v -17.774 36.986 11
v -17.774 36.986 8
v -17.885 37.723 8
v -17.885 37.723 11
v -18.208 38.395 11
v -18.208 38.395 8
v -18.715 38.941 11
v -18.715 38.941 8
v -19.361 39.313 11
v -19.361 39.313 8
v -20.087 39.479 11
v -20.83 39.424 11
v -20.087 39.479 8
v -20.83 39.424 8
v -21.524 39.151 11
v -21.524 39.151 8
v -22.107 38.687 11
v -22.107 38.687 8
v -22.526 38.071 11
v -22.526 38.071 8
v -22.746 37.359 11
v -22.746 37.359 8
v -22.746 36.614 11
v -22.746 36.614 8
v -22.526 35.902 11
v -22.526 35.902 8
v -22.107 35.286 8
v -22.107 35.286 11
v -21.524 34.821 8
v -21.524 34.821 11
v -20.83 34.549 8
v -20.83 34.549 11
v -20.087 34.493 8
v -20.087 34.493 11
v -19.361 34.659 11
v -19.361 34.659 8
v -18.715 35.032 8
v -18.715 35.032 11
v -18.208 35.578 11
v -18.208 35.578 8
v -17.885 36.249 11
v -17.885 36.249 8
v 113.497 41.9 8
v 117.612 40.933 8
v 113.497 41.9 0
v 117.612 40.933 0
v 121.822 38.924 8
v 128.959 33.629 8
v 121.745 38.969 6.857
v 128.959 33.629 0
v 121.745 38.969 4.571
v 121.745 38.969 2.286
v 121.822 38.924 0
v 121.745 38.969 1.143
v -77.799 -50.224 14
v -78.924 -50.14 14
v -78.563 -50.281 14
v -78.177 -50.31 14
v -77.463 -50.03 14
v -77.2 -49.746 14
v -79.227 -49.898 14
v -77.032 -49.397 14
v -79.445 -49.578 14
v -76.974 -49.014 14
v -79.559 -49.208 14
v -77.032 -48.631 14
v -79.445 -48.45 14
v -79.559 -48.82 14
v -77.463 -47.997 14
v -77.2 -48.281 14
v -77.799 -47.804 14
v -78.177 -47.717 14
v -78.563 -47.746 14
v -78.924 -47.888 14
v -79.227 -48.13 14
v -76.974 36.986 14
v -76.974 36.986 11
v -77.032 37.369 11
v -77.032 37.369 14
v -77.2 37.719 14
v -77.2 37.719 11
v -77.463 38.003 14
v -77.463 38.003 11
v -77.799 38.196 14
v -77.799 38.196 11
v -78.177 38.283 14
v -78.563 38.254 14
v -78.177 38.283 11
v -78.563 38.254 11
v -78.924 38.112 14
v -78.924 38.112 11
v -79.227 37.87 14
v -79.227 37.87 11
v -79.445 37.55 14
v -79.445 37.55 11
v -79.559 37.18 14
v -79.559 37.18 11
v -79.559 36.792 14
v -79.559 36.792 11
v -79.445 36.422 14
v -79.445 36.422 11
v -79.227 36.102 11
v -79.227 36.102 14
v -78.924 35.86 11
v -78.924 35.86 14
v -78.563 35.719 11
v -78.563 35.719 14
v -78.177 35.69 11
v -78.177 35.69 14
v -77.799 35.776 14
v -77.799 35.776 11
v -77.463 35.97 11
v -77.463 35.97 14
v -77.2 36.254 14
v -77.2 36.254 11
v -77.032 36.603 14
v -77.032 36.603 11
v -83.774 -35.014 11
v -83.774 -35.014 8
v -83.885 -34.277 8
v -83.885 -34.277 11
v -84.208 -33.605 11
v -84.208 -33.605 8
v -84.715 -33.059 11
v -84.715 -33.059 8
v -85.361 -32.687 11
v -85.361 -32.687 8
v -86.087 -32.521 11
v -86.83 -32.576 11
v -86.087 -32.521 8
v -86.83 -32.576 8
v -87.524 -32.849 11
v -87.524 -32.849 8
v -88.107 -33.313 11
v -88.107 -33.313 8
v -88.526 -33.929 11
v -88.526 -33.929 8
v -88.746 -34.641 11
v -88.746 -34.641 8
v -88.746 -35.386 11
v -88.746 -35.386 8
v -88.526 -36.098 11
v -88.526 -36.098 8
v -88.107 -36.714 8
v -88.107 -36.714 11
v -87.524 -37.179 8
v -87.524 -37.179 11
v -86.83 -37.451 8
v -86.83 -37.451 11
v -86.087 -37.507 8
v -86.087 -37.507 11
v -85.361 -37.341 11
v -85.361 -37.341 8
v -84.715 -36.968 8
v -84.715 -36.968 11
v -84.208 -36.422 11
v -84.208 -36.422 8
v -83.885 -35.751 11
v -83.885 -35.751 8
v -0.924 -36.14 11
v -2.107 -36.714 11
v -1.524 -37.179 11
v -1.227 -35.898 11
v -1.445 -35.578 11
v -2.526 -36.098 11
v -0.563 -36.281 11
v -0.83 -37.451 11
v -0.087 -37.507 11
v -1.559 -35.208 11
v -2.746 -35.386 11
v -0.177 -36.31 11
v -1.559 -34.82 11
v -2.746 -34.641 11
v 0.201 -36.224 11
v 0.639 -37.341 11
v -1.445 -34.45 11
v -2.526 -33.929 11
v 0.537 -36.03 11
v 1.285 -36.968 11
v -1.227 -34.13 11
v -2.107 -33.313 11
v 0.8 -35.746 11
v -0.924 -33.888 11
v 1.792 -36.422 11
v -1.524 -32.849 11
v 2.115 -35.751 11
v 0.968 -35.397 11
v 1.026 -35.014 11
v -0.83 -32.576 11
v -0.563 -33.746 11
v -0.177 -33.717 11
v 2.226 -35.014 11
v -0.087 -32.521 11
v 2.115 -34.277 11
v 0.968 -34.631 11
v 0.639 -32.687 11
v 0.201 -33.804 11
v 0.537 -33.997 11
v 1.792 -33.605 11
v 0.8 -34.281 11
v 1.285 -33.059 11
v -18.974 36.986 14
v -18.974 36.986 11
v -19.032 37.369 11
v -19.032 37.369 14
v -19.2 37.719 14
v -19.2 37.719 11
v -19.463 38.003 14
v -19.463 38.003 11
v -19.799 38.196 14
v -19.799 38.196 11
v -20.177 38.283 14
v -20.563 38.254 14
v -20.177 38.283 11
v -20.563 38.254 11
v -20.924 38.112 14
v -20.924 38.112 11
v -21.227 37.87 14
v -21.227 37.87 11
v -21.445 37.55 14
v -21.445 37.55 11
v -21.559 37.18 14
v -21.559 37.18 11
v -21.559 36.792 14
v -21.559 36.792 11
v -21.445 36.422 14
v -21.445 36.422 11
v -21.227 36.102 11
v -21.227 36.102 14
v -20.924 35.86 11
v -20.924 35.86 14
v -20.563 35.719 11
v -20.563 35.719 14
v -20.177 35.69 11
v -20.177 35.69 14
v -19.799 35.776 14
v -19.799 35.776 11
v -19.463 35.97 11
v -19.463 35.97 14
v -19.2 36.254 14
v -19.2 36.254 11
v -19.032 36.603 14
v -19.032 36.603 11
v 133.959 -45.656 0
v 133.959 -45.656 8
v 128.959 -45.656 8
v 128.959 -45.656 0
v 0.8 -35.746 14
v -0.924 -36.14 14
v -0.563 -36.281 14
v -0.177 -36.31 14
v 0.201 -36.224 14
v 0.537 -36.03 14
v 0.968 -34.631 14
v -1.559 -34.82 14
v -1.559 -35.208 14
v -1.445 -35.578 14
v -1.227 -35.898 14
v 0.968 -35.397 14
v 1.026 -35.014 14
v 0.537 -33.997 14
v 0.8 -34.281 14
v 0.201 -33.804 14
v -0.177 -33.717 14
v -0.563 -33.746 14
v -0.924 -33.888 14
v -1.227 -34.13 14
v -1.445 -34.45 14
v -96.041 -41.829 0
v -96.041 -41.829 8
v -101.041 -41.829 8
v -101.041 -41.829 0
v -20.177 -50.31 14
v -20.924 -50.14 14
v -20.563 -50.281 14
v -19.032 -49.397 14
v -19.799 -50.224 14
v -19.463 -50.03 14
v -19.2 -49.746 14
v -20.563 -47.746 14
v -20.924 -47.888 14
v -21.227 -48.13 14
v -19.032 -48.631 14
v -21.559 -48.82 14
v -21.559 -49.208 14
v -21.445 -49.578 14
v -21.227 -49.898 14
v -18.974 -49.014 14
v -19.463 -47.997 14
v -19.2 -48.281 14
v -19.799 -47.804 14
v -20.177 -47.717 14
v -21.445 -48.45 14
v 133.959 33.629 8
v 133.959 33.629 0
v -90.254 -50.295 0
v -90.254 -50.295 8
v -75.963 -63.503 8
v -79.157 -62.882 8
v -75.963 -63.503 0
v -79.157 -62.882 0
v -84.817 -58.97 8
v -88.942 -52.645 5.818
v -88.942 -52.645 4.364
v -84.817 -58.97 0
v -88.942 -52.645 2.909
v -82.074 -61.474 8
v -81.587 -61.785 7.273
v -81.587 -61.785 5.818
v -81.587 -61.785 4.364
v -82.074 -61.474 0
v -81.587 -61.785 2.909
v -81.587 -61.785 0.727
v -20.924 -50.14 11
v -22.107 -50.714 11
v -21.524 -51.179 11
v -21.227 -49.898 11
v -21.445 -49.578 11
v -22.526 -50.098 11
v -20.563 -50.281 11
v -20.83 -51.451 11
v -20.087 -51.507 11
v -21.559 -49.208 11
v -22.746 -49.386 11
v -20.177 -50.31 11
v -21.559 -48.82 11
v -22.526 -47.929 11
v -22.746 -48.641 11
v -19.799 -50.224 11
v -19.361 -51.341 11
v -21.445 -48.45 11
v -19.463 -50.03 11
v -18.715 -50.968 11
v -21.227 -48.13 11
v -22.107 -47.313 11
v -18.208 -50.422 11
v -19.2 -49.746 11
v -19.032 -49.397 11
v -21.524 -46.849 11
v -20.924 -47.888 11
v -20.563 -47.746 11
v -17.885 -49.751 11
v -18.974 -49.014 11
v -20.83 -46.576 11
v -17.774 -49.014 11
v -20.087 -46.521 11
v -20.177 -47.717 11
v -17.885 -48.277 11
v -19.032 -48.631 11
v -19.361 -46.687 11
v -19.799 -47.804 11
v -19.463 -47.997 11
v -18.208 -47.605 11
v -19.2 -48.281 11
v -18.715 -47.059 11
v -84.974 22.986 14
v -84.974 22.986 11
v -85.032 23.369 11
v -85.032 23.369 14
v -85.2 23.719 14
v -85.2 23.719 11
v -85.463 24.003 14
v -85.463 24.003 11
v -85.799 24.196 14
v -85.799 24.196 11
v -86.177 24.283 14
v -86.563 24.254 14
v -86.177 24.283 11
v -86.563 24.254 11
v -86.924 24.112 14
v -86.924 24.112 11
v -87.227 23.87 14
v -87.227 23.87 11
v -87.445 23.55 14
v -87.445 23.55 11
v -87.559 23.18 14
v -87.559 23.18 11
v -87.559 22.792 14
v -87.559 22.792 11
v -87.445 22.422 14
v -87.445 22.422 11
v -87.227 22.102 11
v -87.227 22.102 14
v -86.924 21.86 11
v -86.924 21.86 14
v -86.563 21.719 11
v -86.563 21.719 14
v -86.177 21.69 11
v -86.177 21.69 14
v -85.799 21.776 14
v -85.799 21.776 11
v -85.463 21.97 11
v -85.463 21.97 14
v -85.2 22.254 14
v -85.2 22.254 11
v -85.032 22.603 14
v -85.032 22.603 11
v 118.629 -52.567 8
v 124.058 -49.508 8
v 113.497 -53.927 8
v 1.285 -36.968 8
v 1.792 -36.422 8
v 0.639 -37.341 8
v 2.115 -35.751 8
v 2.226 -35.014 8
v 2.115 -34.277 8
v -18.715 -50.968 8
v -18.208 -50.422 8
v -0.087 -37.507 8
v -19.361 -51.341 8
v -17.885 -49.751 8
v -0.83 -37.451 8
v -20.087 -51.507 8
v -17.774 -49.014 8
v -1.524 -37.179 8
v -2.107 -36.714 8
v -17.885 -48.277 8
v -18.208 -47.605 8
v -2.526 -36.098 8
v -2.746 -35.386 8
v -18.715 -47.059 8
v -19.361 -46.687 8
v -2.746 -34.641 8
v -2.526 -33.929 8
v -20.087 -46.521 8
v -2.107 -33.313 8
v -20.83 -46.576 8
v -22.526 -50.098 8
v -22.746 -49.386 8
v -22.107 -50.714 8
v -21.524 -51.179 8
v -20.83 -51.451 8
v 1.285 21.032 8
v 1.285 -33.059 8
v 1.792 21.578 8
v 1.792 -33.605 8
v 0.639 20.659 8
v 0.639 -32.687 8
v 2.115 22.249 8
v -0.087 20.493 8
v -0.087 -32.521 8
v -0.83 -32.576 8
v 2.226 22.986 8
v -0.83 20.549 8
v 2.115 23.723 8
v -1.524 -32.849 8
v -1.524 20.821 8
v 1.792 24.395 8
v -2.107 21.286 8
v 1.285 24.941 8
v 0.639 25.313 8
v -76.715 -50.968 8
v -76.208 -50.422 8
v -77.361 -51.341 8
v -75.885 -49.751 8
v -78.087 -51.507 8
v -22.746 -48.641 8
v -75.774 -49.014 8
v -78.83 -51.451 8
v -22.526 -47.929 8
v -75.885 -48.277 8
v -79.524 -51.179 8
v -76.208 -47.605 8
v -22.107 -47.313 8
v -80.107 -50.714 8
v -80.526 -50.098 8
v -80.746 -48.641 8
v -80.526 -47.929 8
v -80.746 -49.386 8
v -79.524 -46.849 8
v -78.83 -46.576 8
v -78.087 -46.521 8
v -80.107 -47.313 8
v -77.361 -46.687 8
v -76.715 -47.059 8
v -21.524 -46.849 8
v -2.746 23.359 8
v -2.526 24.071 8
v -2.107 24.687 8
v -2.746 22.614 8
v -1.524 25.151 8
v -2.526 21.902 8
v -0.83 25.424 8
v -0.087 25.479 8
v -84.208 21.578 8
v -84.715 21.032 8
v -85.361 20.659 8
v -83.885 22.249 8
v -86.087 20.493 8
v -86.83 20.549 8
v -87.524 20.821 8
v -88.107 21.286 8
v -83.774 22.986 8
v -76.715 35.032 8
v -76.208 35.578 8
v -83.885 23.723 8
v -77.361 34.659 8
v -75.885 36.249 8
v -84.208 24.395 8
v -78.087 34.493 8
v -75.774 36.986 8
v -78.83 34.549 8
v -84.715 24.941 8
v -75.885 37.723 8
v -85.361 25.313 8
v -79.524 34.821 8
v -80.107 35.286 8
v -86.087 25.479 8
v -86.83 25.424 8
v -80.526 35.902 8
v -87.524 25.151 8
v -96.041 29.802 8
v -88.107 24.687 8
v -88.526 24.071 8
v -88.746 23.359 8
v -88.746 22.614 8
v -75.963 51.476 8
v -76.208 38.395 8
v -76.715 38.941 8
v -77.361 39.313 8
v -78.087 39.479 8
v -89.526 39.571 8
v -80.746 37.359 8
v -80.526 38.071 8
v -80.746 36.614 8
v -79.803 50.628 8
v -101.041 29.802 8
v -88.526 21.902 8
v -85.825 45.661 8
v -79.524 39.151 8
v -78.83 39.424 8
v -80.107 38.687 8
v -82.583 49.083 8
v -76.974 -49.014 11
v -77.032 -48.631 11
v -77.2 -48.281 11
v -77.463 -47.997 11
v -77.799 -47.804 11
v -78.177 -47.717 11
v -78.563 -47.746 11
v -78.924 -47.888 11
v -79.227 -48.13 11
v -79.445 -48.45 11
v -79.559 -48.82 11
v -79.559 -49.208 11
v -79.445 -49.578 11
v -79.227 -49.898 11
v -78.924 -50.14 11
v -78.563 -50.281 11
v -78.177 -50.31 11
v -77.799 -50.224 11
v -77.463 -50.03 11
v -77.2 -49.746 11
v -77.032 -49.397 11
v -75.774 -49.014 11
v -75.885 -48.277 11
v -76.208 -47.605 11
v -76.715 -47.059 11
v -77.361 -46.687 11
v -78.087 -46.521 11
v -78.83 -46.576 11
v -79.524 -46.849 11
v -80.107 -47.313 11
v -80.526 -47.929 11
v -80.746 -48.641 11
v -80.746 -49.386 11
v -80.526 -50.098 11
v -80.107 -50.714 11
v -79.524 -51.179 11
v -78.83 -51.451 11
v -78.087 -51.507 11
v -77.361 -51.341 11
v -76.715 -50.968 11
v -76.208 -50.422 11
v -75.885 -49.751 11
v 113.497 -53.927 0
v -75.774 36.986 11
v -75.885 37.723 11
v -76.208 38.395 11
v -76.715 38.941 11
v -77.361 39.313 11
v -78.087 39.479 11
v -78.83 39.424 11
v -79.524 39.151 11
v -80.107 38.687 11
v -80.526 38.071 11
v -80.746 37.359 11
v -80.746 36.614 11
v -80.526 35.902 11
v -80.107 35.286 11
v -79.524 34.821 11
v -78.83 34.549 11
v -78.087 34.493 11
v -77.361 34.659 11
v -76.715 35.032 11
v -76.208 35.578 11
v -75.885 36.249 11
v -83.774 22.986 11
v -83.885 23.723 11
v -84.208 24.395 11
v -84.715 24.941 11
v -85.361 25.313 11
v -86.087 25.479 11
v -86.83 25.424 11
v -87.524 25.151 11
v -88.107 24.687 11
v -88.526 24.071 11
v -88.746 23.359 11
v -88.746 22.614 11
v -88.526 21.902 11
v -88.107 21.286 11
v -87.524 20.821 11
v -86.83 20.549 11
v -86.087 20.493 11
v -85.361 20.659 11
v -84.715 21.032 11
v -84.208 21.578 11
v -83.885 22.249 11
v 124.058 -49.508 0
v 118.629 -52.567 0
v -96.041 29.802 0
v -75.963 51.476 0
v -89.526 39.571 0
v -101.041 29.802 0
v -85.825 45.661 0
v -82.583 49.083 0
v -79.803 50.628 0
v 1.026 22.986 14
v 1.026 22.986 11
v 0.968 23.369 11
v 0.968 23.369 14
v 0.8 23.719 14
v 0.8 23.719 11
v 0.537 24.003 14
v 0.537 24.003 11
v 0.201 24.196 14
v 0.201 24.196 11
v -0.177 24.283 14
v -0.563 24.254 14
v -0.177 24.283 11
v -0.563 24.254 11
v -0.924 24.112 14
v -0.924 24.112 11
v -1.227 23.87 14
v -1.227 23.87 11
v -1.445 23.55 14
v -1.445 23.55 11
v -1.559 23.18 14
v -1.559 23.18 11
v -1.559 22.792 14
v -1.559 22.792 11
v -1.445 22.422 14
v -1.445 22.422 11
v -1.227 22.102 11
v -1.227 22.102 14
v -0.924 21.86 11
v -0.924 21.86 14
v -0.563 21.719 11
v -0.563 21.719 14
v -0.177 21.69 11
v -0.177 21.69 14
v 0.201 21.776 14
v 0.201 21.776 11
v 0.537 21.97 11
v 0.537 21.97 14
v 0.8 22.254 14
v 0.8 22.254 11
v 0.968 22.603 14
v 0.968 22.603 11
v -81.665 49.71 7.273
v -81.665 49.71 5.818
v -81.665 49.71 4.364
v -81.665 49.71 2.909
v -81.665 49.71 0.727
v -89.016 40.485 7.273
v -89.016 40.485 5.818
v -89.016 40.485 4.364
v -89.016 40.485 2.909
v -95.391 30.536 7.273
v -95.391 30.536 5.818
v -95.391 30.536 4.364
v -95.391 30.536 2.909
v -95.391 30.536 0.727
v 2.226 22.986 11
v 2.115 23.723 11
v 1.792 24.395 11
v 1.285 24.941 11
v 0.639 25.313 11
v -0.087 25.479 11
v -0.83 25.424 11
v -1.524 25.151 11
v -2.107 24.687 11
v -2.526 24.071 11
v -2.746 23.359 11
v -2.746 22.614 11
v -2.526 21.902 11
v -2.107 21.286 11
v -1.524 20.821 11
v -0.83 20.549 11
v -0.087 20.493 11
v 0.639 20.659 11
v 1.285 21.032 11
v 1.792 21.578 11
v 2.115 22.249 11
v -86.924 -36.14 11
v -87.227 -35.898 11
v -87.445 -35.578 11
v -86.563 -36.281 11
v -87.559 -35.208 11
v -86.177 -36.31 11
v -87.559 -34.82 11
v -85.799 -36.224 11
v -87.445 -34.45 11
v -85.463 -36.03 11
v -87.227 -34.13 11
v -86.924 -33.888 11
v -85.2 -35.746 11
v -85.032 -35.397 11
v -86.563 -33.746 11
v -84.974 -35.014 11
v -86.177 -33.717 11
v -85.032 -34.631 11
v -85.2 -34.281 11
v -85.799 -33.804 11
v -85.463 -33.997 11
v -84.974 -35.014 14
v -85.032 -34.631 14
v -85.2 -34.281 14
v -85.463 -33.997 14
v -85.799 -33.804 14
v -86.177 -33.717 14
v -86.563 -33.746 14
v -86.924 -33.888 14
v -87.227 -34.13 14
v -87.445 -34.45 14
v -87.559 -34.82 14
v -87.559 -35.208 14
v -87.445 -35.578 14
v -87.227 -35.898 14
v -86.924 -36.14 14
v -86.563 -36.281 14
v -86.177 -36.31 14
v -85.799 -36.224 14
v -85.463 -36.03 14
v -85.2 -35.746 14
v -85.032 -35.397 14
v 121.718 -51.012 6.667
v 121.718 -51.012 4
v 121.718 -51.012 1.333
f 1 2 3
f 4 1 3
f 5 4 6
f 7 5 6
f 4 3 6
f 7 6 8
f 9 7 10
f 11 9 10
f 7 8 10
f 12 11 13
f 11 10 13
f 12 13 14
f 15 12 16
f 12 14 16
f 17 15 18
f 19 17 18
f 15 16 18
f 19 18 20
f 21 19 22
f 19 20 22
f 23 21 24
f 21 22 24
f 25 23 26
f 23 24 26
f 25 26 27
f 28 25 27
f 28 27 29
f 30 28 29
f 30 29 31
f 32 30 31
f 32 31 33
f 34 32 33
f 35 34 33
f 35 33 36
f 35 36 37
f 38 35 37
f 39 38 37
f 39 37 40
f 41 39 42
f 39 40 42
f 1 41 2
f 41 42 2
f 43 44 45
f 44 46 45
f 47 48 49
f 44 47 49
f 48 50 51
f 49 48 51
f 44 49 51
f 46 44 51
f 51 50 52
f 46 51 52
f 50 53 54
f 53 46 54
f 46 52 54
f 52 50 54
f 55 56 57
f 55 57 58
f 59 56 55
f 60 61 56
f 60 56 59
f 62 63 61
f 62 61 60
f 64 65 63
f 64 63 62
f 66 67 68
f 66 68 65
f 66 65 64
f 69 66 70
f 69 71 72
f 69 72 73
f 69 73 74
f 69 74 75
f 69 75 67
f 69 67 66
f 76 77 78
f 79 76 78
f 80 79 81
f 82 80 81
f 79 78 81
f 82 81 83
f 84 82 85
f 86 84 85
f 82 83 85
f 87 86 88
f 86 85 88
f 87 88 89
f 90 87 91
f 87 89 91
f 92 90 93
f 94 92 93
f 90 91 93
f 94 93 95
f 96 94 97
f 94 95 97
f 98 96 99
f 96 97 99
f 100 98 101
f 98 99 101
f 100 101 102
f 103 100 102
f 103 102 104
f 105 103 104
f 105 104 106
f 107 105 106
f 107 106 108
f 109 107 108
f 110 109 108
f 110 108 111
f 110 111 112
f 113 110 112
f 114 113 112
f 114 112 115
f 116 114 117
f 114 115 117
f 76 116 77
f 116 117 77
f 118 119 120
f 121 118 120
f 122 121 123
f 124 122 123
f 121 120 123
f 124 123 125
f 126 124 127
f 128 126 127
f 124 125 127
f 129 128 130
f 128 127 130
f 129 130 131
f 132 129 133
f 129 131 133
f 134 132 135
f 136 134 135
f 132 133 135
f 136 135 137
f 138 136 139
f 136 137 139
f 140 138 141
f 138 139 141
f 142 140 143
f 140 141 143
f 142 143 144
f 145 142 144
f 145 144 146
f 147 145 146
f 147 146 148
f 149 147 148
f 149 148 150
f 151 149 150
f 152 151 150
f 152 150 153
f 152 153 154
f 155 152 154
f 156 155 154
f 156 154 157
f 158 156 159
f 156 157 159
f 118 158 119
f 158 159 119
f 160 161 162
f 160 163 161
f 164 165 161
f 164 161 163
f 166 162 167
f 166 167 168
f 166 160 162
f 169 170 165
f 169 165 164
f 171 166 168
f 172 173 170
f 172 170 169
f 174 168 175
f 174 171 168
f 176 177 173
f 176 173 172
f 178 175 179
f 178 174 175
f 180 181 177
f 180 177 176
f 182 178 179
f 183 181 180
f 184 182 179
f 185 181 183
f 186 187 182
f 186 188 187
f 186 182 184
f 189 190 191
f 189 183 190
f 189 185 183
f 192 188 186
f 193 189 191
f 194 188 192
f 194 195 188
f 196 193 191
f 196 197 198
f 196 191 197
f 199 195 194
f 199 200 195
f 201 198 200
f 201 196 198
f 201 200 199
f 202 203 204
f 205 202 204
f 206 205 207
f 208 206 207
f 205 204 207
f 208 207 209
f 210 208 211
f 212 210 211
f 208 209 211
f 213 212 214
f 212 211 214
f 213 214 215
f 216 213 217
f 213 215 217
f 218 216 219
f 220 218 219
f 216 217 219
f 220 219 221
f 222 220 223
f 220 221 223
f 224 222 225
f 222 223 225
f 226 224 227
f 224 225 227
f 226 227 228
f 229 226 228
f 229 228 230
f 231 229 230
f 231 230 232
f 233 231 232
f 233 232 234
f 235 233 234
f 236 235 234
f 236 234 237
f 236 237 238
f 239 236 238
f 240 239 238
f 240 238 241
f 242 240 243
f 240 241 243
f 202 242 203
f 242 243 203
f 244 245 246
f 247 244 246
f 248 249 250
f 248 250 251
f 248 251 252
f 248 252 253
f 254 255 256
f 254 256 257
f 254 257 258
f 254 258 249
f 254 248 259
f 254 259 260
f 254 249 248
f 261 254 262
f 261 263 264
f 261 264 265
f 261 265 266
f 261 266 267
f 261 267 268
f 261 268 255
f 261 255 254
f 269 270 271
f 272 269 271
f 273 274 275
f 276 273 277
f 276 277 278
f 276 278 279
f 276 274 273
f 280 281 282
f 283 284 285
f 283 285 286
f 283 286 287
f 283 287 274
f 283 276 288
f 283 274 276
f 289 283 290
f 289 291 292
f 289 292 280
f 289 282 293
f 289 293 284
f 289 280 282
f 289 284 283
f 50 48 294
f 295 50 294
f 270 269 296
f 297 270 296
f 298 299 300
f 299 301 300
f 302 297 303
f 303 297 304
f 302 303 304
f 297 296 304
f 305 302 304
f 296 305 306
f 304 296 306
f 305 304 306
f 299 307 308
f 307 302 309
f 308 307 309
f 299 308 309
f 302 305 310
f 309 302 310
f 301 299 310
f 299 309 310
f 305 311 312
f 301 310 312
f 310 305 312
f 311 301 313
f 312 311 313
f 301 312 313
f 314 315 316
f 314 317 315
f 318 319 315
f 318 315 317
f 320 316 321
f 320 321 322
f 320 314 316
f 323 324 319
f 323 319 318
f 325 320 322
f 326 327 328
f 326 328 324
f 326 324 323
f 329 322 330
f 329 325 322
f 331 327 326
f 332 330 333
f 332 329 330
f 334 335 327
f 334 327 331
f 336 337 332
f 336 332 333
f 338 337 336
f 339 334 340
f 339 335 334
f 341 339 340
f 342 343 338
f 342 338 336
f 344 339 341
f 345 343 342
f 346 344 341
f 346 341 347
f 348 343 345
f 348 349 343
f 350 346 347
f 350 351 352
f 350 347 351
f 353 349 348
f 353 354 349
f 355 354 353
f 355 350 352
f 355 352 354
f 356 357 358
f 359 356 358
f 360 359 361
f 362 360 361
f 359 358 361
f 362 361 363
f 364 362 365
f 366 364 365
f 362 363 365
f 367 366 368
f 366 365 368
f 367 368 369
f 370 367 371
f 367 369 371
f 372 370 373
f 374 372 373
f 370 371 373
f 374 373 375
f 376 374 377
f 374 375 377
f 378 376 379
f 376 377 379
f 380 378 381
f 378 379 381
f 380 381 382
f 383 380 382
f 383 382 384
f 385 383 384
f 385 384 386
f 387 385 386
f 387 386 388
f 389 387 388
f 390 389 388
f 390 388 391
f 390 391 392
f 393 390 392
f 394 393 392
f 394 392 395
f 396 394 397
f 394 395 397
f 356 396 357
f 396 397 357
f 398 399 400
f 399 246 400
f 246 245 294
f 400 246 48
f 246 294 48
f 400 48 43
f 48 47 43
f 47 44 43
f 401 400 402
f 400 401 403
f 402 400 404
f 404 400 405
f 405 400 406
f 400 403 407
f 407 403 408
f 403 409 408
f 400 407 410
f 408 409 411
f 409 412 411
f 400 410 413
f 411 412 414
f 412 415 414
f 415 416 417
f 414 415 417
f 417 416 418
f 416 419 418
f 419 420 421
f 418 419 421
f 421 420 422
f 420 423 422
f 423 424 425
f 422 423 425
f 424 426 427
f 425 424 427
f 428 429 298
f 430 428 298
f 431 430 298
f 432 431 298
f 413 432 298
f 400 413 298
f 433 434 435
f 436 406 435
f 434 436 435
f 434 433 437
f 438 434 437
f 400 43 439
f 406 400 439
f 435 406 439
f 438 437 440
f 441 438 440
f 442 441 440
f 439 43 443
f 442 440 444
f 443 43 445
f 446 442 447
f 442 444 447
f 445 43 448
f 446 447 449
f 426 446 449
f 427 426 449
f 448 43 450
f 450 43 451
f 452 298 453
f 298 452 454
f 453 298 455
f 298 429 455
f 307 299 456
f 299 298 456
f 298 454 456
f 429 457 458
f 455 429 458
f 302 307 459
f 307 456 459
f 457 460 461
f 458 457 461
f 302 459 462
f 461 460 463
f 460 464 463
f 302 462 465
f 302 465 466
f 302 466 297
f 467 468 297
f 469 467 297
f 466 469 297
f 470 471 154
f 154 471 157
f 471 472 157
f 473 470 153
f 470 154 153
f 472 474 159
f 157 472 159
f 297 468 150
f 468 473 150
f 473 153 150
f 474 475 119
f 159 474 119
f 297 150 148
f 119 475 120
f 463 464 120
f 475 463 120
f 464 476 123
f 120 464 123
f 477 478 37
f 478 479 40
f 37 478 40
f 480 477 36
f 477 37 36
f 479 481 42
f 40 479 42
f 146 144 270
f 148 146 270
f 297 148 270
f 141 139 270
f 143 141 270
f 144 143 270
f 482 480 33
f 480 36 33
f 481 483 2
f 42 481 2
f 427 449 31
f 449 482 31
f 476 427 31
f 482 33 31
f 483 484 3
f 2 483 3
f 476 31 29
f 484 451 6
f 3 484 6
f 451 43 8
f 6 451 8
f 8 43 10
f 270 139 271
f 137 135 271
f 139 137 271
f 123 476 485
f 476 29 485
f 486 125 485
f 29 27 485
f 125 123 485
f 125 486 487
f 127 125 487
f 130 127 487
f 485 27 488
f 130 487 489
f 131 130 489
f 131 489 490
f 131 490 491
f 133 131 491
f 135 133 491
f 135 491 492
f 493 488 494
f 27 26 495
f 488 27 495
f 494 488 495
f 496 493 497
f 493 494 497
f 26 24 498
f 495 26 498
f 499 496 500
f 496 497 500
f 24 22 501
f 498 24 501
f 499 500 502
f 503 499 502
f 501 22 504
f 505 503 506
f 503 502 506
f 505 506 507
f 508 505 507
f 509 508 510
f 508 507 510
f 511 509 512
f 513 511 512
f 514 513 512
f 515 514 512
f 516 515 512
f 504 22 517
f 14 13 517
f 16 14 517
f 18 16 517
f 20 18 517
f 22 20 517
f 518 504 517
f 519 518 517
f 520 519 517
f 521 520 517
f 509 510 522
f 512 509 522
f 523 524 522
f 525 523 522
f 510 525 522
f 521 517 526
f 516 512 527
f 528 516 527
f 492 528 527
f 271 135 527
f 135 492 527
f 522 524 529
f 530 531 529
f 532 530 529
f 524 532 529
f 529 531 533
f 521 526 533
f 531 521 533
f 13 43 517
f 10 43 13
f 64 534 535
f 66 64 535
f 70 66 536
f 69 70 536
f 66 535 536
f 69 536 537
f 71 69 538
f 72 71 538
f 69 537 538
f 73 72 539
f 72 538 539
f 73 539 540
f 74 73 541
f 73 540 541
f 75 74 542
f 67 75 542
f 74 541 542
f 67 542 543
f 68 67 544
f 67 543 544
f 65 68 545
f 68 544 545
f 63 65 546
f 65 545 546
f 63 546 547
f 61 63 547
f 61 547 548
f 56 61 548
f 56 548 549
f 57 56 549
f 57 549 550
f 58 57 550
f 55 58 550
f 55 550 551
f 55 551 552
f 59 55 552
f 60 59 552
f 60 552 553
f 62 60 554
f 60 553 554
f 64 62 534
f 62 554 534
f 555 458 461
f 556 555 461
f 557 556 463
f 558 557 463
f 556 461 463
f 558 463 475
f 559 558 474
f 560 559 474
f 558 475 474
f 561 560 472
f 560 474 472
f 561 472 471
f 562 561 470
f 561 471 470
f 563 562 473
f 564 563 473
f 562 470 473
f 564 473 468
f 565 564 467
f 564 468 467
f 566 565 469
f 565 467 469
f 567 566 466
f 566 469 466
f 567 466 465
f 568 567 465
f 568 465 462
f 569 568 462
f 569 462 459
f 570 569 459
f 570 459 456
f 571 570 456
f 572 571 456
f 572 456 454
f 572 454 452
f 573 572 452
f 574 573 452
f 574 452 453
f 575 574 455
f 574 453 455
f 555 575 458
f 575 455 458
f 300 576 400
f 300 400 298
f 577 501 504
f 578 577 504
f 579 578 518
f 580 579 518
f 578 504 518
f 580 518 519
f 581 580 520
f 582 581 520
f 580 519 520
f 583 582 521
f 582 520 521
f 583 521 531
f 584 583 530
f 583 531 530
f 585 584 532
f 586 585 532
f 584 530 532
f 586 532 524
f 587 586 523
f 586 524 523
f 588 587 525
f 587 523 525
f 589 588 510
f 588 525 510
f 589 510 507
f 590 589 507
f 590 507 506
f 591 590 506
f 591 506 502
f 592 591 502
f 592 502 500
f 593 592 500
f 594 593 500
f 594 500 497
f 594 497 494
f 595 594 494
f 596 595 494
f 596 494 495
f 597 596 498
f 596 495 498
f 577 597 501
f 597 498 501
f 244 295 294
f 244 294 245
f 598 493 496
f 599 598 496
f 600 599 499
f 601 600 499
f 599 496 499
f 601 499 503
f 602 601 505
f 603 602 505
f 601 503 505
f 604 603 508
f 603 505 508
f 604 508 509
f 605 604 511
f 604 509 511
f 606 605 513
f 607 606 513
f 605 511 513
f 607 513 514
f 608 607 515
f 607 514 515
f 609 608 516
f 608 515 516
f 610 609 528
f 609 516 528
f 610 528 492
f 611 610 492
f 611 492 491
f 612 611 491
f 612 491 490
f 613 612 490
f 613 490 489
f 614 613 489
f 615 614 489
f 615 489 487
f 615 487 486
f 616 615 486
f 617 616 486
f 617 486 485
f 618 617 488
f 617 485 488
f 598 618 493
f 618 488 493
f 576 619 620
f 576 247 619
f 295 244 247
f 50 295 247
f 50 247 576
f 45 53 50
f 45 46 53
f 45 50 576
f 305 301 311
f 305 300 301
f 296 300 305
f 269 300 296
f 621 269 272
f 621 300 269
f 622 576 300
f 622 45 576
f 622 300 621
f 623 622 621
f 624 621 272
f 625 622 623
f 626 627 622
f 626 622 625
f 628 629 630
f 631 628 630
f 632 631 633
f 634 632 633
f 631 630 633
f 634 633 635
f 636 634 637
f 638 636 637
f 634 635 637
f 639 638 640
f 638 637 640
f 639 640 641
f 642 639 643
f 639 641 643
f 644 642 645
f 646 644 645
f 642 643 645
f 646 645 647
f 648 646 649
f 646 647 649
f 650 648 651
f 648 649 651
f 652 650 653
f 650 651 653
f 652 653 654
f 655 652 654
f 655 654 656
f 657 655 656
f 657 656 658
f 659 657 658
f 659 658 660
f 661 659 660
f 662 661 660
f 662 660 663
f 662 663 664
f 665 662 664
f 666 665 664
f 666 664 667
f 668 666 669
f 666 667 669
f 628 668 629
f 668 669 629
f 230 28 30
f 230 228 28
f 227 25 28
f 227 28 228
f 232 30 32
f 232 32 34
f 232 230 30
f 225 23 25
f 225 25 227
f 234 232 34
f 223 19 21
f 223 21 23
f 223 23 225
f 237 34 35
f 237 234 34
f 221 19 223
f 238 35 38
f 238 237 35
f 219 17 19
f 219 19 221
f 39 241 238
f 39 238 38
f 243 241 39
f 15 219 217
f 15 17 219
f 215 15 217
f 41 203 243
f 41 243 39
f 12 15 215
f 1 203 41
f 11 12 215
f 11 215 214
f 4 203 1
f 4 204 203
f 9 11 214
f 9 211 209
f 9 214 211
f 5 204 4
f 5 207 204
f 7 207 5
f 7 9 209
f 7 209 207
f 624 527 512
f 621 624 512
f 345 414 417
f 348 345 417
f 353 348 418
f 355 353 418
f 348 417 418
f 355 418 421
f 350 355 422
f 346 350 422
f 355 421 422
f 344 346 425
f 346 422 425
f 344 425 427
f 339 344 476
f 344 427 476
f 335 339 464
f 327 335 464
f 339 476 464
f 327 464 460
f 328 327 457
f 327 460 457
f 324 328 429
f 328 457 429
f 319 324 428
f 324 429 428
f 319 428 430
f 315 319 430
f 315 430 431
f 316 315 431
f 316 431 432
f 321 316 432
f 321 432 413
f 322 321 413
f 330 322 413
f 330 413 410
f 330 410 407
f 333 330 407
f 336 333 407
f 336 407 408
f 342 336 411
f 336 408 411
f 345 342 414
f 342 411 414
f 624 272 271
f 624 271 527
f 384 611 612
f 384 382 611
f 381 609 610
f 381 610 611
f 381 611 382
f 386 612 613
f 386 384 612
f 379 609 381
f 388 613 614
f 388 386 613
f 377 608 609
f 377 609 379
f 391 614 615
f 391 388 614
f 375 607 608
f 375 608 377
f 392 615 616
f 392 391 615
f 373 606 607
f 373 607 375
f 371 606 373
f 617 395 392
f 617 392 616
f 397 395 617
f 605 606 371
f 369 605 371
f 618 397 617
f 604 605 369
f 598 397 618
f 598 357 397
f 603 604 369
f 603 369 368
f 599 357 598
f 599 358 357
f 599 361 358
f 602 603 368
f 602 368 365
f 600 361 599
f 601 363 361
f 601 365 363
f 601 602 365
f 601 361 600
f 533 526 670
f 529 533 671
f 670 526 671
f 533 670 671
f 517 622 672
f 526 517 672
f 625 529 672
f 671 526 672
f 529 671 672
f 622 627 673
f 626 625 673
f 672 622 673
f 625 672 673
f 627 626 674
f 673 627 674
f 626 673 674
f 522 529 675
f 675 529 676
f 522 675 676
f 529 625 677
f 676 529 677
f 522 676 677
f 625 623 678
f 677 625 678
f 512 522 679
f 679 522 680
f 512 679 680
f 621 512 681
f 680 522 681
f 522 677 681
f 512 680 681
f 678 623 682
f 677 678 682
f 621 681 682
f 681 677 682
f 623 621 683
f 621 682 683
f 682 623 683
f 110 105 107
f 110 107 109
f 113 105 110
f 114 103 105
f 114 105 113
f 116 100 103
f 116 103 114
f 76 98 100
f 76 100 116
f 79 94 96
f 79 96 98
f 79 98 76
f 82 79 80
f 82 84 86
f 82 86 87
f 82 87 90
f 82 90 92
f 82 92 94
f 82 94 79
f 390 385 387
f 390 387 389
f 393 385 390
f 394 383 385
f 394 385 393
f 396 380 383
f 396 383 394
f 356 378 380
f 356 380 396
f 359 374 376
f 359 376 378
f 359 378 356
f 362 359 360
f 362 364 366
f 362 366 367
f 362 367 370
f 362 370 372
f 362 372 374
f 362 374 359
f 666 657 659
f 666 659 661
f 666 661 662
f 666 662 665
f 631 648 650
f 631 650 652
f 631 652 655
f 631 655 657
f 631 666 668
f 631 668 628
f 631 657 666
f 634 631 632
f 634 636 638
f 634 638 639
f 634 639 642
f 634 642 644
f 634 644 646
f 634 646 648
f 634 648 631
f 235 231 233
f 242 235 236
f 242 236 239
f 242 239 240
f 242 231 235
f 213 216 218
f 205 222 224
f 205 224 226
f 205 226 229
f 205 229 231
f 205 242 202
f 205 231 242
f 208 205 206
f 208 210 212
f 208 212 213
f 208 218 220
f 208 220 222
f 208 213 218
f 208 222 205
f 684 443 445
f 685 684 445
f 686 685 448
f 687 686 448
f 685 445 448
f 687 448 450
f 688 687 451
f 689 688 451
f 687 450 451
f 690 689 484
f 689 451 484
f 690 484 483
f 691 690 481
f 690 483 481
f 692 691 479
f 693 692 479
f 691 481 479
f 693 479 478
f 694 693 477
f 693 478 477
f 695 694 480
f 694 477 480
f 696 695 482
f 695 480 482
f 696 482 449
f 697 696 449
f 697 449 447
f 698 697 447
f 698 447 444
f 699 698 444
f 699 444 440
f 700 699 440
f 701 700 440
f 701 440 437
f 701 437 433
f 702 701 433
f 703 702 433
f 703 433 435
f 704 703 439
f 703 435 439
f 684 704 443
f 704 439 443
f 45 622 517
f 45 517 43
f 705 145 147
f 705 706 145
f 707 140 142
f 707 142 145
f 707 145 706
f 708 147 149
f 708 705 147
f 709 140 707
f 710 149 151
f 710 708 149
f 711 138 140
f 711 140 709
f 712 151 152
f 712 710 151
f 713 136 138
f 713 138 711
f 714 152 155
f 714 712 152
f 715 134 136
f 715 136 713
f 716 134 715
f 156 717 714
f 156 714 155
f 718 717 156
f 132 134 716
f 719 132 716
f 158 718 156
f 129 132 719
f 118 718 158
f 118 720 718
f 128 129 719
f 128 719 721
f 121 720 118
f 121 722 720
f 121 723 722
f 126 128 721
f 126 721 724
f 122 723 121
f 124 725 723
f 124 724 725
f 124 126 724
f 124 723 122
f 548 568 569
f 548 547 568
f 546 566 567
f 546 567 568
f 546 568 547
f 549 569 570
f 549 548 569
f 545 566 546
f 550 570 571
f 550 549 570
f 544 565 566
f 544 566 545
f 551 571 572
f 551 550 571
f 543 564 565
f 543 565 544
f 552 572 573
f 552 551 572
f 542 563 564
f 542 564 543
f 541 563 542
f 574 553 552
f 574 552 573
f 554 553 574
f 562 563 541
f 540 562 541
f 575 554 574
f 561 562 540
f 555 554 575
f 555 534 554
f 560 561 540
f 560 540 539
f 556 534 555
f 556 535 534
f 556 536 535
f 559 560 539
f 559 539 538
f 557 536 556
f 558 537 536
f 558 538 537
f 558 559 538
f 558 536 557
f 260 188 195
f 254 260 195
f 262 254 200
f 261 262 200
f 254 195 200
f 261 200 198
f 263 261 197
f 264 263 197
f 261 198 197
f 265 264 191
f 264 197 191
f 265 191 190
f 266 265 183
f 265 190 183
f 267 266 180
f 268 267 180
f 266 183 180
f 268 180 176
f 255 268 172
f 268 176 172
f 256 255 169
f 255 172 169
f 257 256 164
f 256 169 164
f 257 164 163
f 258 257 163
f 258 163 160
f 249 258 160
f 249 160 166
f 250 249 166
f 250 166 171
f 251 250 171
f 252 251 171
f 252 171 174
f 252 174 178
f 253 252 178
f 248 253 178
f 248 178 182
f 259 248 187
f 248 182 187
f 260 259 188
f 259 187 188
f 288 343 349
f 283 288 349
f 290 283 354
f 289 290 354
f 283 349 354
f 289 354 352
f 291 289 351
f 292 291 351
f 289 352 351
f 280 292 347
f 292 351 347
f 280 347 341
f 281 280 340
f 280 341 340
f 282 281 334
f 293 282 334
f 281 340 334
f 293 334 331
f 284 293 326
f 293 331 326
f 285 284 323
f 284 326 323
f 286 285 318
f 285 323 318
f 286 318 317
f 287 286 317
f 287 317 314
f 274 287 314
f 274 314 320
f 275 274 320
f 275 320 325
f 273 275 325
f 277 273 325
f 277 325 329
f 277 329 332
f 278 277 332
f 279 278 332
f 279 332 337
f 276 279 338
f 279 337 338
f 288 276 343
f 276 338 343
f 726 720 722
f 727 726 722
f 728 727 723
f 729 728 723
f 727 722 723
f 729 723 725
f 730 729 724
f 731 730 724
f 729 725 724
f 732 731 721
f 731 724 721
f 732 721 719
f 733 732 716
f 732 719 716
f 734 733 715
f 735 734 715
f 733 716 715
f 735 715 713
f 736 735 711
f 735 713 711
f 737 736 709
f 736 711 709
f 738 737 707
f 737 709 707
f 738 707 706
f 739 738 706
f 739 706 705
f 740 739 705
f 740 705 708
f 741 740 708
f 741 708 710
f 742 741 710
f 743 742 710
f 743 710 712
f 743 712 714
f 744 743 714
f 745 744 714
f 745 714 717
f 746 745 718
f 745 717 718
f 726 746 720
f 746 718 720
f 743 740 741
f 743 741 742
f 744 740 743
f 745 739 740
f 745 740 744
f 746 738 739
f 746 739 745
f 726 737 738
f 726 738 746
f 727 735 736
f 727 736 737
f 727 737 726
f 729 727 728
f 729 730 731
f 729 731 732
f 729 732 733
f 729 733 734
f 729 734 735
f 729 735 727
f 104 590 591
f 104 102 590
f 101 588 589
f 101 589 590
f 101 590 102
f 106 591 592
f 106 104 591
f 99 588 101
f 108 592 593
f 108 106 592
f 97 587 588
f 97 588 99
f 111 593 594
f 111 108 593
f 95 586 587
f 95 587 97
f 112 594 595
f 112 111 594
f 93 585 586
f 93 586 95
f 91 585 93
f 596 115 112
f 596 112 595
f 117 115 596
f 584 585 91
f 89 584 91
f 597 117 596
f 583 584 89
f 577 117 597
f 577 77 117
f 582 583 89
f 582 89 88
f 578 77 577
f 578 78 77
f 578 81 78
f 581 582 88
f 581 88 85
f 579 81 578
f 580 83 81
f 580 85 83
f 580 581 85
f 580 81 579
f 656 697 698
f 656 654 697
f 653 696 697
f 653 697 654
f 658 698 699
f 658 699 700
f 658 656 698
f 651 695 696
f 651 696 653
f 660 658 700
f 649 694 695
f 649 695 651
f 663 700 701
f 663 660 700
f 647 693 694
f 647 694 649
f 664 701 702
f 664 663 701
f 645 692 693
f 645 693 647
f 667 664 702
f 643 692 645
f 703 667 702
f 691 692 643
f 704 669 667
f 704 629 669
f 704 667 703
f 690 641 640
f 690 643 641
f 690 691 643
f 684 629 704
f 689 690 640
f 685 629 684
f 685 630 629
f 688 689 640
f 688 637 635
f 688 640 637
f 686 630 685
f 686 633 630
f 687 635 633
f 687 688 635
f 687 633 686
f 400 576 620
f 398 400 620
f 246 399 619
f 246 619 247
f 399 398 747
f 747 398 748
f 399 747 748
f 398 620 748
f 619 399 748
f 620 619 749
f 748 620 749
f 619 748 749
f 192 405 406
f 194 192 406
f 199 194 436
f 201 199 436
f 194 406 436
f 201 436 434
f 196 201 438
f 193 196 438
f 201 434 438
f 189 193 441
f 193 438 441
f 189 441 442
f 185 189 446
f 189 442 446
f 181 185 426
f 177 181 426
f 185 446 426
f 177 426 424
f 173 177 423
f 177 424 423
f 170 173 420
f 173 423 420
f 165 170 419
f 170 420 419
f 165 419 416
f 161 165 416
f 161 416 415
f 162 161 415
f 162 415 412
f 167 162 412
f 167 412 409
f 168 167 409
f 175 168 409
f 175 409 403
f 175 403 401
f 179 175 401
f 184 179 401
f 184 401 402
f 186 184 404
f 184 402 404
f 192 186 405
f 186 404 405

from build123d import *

# Parameters (mm, degrees)
BOSS_EXTRUDE1_DEPTH = 8
SKETCH2_R           = 2.5
BOSS_EXTRUDE2_DEPTH = 3
SKETCH3_R           = 1.3
BOSS_EXTRUDE3_DEPTH = 3


with BuildPart() as part:
    # Sketch1 → Boss-Extrude1 (new body)
    with BuildSketch(Plane.XY):
        with BuildLine():
            Line((128.959100066, 33.628624999), (133.959100066, 33.628624999))
            Line((133.959100066, 33.628624999), (133.959100066, -45.656116492))
            Line((133.959100066, -45.656116492), (128.959100066, -45.656116492))
            add(Edge.make_bspline(
                [(113.496599029, -53.92747215), (114.973875685, -53.76034768), (116.389465073, -53.408303088), (118.438931288, -52.658652366), (119.109837198, -52.372048444), (120.430638868, -51.735858399), (121.082915856, -51.384782434), (122.988929436, -50.267489711), (124.197203446, -49.437169981), (126.541735842, -47.677906536), (127.677620036, -46.748450374), (128.850515141, -45.74891878), (128.904828159, -45.702543351), (128.959100066, -45.656116492)],
                knots=[0, 0, 0, 0, 0.125, 0.125, 0.1875, 0.1875, 0.25, 0.25, 0.375, 0.375, 0.5, 0.5, 0.506074438, 0.506074438, 0.506074438, 0.506074438], degree=3))
            Line((113.496599029, -53.92747215), (-75.963345356, -63.503442328))
            add(Edge.make_bspline(
                [(-96.040899934, -41.829259963), (-95.798899268, -42.093160096), (-95.56197213, -42.362136183), (-94.03954966, -44.156758027), (-92.923608678, -45.792412437), (-90.858487716, -49.170948695), (-89.911065512, -50.914960796), (-88.457766632, -53.51029646), (-87.967520262, -54.371999904), (-86.940892781, -56.06392928), (-86.404912323, -56.894254814), (-85.530671439, -58.091259413), (-85.227414802, -58.482089731), (-84.588818098, -59.241614046), (-84.254184704, -59.609132259), (-83.204929916, -60.651600397), (-82.440569541, -61.270576891), (-81.160629249, -62.042718444), (-80.719255742, -62.269433113), (-79.817314106, -62.660888928), (-79.3554021, -62.826549047), (-77.940467092, -63.243286827), (-76.954208328, -63.414201398), (-75.963345356, -63.503442328)],
                knots=[0.352672192, 0.352672192, 0.352672192, 0.352672192, 0.375, 0.375, 0.5, 0.5, 0.625, 0.625, 0.6875, 0.6875, 0.75, 0.75, 0.78125, 0.78125, 0.8125, 0.8125, 0.875, 0.875, 0.90625, 0.90625, 0.9375, 0.9375, 1, 1, 1, 1], degree=3))
            Line((-96.040899934, -41.829259963), (-101.040899934, -41.829259963))
            Line((-101.040899934, -41.829259963), (-101.040899934, 29.801740739))
            Line((-101.040899934, 29.801740739), (-96.040899934, 29.801740739))
            add(Edge.make_bspline(
                [(-75.963345356, 51.475952827), (-76.969760945, 51.385311169), (-77.956664013, 51.213742336), (-79.395866789, 50.78571401), (-79.86970863, 50.613871194), (-80.796837185, 50.204577199), (-81.240590365, 49.971323111), (-82.089787414, 49.449496549), (-82.495246976, 49.160946736), (-83.271465049, 48.533739024), (-83.643007435, 48.194375714), (-84.708444042, 47.116795042), (-85.333215001, 46.343374139), (-86.491296884, 44.737676097), (-87.023827607, 43.904896882), (-88.044872363, 42.211012893), (-88.533034054, 41.34968138), (-89.982900727, 38.756279626), (-90.93240726, 37.013628654), (-92.999467157, 33.650383947), (-94.114586107, 32.031232641), (-95.60337212, 30.287705281), (-95.819744565, 30.042891916), (-96.040899934, 29.801740739)],
                knots=[0, 0, 0, 0, 0.0625, 0.0625, 0.09375, 0.09375, 0.125, 0.125, 0.15625, 0.15625, 0.1875, 0.1875, 0.25, 0.25, 0.3125, 0.3125, 0.375, 0.375, 0.5, 0.5, 0.625, 0.625, 0.645748558, 0.645748558, 0.645748558, 0.645748558], degree=3))
            Line((-75.963345356, 51.475952827), (113.496599029, 41.899982649))
            add(Edge.make_bspline(
                [(128.959100066, 33.628624999), (128.913387154, 33.667730585), (127.751192536, 34.660386778), (126.568806099, 35.629041088), (124.805320754, 36.953884089), (124.207009004, 37.38378621), (122.992052543, 38.206145046), (122.374602128, 38.599251589), (120.484333172, 39.709851881), (119.174169326, 40.359663675), (117.093195419, 41.124643977), (116.387101294, 41.341482025), (114.957490187, 41.687263925), (114.232477088, 41.816732683), (113.496599029, 41.899982649)],
                knots=[0.494878569, 0.494878569, 0.494878569, 0.494878569, 0.5, 0.625, 0.625, 0.6875, 0.6875, 0.75, 0.75, 0.875, 0.875, 0.9375, 0.9375, 1, 1, 1, 1], degree=3))
        make_face()
    extrude(amount=BOSS_EXTRUDE1_DEPTH)

    # Sketch2 → Boss-Extrude2 (add)
    with BuildSketch(Plane.XY.offset(8)):
        with Locations((-86.273928885, 22.986240388)):
            Circle(SKETCH2_R)
        with Locations((-78.273928885, 36.986240388)):
            Circle(SKETCH2_R)
        with Locations((-20.273928885, 36.986240388)):
            Circle(SKETCH2_R)
        with Locations((-0.273928885, 22.986240388)):
            Circle(SKETCH2_R)
        with Locations((-0.273928885, -35.013759612)):
            Circle(SKETCH2_R)
        with Locations((-20.273928885, -49.013759612)):
            Circle(SKETCH2_R)
        with Locations((-78.273928885, -49.013759612)):
            Circle(SKETCH2_R)
        with Locations((-86.273928885, -35.013759612)):
            Circle(SKETCH2_R)
    extrude(amount=BOSS_EXTRUDE2_DEPTH)

    # Sketch3 → Boss-Extrude3 (add)
    with BuildSketch(Plane.XY.offset(11)):
        with Locations((-86.273928885, 22.986240388)):
            Circle(SKETCH3_R)
        with Locations((-78.273928885, 36.986240388)):
            Circle(SKETCH3_R)
        with Locations((-20.273928885, 36.986240388)):
            Circle(SKETCH3_R)
        with Locations((-0.273928885, 22.986240388)):
            Circle(SKETCH3_R)
        with Locations((-0.273928885, -35.013759612)):
            Circle(SKETCH3_R)
        with Locations((-20.273928885, -49.013759612)):
            Circle(SKETCH3_R)
        with Locations((-78.273928885, -49.013759612)):
            Circle(SKETCH3_R)
        with Locations((-86.273928885, -35.013759612)):
            Circle(SKETCH3_R)
    extrude(amount=BOSS_EXTRUDE3_DEPTH)


solid = part.part
